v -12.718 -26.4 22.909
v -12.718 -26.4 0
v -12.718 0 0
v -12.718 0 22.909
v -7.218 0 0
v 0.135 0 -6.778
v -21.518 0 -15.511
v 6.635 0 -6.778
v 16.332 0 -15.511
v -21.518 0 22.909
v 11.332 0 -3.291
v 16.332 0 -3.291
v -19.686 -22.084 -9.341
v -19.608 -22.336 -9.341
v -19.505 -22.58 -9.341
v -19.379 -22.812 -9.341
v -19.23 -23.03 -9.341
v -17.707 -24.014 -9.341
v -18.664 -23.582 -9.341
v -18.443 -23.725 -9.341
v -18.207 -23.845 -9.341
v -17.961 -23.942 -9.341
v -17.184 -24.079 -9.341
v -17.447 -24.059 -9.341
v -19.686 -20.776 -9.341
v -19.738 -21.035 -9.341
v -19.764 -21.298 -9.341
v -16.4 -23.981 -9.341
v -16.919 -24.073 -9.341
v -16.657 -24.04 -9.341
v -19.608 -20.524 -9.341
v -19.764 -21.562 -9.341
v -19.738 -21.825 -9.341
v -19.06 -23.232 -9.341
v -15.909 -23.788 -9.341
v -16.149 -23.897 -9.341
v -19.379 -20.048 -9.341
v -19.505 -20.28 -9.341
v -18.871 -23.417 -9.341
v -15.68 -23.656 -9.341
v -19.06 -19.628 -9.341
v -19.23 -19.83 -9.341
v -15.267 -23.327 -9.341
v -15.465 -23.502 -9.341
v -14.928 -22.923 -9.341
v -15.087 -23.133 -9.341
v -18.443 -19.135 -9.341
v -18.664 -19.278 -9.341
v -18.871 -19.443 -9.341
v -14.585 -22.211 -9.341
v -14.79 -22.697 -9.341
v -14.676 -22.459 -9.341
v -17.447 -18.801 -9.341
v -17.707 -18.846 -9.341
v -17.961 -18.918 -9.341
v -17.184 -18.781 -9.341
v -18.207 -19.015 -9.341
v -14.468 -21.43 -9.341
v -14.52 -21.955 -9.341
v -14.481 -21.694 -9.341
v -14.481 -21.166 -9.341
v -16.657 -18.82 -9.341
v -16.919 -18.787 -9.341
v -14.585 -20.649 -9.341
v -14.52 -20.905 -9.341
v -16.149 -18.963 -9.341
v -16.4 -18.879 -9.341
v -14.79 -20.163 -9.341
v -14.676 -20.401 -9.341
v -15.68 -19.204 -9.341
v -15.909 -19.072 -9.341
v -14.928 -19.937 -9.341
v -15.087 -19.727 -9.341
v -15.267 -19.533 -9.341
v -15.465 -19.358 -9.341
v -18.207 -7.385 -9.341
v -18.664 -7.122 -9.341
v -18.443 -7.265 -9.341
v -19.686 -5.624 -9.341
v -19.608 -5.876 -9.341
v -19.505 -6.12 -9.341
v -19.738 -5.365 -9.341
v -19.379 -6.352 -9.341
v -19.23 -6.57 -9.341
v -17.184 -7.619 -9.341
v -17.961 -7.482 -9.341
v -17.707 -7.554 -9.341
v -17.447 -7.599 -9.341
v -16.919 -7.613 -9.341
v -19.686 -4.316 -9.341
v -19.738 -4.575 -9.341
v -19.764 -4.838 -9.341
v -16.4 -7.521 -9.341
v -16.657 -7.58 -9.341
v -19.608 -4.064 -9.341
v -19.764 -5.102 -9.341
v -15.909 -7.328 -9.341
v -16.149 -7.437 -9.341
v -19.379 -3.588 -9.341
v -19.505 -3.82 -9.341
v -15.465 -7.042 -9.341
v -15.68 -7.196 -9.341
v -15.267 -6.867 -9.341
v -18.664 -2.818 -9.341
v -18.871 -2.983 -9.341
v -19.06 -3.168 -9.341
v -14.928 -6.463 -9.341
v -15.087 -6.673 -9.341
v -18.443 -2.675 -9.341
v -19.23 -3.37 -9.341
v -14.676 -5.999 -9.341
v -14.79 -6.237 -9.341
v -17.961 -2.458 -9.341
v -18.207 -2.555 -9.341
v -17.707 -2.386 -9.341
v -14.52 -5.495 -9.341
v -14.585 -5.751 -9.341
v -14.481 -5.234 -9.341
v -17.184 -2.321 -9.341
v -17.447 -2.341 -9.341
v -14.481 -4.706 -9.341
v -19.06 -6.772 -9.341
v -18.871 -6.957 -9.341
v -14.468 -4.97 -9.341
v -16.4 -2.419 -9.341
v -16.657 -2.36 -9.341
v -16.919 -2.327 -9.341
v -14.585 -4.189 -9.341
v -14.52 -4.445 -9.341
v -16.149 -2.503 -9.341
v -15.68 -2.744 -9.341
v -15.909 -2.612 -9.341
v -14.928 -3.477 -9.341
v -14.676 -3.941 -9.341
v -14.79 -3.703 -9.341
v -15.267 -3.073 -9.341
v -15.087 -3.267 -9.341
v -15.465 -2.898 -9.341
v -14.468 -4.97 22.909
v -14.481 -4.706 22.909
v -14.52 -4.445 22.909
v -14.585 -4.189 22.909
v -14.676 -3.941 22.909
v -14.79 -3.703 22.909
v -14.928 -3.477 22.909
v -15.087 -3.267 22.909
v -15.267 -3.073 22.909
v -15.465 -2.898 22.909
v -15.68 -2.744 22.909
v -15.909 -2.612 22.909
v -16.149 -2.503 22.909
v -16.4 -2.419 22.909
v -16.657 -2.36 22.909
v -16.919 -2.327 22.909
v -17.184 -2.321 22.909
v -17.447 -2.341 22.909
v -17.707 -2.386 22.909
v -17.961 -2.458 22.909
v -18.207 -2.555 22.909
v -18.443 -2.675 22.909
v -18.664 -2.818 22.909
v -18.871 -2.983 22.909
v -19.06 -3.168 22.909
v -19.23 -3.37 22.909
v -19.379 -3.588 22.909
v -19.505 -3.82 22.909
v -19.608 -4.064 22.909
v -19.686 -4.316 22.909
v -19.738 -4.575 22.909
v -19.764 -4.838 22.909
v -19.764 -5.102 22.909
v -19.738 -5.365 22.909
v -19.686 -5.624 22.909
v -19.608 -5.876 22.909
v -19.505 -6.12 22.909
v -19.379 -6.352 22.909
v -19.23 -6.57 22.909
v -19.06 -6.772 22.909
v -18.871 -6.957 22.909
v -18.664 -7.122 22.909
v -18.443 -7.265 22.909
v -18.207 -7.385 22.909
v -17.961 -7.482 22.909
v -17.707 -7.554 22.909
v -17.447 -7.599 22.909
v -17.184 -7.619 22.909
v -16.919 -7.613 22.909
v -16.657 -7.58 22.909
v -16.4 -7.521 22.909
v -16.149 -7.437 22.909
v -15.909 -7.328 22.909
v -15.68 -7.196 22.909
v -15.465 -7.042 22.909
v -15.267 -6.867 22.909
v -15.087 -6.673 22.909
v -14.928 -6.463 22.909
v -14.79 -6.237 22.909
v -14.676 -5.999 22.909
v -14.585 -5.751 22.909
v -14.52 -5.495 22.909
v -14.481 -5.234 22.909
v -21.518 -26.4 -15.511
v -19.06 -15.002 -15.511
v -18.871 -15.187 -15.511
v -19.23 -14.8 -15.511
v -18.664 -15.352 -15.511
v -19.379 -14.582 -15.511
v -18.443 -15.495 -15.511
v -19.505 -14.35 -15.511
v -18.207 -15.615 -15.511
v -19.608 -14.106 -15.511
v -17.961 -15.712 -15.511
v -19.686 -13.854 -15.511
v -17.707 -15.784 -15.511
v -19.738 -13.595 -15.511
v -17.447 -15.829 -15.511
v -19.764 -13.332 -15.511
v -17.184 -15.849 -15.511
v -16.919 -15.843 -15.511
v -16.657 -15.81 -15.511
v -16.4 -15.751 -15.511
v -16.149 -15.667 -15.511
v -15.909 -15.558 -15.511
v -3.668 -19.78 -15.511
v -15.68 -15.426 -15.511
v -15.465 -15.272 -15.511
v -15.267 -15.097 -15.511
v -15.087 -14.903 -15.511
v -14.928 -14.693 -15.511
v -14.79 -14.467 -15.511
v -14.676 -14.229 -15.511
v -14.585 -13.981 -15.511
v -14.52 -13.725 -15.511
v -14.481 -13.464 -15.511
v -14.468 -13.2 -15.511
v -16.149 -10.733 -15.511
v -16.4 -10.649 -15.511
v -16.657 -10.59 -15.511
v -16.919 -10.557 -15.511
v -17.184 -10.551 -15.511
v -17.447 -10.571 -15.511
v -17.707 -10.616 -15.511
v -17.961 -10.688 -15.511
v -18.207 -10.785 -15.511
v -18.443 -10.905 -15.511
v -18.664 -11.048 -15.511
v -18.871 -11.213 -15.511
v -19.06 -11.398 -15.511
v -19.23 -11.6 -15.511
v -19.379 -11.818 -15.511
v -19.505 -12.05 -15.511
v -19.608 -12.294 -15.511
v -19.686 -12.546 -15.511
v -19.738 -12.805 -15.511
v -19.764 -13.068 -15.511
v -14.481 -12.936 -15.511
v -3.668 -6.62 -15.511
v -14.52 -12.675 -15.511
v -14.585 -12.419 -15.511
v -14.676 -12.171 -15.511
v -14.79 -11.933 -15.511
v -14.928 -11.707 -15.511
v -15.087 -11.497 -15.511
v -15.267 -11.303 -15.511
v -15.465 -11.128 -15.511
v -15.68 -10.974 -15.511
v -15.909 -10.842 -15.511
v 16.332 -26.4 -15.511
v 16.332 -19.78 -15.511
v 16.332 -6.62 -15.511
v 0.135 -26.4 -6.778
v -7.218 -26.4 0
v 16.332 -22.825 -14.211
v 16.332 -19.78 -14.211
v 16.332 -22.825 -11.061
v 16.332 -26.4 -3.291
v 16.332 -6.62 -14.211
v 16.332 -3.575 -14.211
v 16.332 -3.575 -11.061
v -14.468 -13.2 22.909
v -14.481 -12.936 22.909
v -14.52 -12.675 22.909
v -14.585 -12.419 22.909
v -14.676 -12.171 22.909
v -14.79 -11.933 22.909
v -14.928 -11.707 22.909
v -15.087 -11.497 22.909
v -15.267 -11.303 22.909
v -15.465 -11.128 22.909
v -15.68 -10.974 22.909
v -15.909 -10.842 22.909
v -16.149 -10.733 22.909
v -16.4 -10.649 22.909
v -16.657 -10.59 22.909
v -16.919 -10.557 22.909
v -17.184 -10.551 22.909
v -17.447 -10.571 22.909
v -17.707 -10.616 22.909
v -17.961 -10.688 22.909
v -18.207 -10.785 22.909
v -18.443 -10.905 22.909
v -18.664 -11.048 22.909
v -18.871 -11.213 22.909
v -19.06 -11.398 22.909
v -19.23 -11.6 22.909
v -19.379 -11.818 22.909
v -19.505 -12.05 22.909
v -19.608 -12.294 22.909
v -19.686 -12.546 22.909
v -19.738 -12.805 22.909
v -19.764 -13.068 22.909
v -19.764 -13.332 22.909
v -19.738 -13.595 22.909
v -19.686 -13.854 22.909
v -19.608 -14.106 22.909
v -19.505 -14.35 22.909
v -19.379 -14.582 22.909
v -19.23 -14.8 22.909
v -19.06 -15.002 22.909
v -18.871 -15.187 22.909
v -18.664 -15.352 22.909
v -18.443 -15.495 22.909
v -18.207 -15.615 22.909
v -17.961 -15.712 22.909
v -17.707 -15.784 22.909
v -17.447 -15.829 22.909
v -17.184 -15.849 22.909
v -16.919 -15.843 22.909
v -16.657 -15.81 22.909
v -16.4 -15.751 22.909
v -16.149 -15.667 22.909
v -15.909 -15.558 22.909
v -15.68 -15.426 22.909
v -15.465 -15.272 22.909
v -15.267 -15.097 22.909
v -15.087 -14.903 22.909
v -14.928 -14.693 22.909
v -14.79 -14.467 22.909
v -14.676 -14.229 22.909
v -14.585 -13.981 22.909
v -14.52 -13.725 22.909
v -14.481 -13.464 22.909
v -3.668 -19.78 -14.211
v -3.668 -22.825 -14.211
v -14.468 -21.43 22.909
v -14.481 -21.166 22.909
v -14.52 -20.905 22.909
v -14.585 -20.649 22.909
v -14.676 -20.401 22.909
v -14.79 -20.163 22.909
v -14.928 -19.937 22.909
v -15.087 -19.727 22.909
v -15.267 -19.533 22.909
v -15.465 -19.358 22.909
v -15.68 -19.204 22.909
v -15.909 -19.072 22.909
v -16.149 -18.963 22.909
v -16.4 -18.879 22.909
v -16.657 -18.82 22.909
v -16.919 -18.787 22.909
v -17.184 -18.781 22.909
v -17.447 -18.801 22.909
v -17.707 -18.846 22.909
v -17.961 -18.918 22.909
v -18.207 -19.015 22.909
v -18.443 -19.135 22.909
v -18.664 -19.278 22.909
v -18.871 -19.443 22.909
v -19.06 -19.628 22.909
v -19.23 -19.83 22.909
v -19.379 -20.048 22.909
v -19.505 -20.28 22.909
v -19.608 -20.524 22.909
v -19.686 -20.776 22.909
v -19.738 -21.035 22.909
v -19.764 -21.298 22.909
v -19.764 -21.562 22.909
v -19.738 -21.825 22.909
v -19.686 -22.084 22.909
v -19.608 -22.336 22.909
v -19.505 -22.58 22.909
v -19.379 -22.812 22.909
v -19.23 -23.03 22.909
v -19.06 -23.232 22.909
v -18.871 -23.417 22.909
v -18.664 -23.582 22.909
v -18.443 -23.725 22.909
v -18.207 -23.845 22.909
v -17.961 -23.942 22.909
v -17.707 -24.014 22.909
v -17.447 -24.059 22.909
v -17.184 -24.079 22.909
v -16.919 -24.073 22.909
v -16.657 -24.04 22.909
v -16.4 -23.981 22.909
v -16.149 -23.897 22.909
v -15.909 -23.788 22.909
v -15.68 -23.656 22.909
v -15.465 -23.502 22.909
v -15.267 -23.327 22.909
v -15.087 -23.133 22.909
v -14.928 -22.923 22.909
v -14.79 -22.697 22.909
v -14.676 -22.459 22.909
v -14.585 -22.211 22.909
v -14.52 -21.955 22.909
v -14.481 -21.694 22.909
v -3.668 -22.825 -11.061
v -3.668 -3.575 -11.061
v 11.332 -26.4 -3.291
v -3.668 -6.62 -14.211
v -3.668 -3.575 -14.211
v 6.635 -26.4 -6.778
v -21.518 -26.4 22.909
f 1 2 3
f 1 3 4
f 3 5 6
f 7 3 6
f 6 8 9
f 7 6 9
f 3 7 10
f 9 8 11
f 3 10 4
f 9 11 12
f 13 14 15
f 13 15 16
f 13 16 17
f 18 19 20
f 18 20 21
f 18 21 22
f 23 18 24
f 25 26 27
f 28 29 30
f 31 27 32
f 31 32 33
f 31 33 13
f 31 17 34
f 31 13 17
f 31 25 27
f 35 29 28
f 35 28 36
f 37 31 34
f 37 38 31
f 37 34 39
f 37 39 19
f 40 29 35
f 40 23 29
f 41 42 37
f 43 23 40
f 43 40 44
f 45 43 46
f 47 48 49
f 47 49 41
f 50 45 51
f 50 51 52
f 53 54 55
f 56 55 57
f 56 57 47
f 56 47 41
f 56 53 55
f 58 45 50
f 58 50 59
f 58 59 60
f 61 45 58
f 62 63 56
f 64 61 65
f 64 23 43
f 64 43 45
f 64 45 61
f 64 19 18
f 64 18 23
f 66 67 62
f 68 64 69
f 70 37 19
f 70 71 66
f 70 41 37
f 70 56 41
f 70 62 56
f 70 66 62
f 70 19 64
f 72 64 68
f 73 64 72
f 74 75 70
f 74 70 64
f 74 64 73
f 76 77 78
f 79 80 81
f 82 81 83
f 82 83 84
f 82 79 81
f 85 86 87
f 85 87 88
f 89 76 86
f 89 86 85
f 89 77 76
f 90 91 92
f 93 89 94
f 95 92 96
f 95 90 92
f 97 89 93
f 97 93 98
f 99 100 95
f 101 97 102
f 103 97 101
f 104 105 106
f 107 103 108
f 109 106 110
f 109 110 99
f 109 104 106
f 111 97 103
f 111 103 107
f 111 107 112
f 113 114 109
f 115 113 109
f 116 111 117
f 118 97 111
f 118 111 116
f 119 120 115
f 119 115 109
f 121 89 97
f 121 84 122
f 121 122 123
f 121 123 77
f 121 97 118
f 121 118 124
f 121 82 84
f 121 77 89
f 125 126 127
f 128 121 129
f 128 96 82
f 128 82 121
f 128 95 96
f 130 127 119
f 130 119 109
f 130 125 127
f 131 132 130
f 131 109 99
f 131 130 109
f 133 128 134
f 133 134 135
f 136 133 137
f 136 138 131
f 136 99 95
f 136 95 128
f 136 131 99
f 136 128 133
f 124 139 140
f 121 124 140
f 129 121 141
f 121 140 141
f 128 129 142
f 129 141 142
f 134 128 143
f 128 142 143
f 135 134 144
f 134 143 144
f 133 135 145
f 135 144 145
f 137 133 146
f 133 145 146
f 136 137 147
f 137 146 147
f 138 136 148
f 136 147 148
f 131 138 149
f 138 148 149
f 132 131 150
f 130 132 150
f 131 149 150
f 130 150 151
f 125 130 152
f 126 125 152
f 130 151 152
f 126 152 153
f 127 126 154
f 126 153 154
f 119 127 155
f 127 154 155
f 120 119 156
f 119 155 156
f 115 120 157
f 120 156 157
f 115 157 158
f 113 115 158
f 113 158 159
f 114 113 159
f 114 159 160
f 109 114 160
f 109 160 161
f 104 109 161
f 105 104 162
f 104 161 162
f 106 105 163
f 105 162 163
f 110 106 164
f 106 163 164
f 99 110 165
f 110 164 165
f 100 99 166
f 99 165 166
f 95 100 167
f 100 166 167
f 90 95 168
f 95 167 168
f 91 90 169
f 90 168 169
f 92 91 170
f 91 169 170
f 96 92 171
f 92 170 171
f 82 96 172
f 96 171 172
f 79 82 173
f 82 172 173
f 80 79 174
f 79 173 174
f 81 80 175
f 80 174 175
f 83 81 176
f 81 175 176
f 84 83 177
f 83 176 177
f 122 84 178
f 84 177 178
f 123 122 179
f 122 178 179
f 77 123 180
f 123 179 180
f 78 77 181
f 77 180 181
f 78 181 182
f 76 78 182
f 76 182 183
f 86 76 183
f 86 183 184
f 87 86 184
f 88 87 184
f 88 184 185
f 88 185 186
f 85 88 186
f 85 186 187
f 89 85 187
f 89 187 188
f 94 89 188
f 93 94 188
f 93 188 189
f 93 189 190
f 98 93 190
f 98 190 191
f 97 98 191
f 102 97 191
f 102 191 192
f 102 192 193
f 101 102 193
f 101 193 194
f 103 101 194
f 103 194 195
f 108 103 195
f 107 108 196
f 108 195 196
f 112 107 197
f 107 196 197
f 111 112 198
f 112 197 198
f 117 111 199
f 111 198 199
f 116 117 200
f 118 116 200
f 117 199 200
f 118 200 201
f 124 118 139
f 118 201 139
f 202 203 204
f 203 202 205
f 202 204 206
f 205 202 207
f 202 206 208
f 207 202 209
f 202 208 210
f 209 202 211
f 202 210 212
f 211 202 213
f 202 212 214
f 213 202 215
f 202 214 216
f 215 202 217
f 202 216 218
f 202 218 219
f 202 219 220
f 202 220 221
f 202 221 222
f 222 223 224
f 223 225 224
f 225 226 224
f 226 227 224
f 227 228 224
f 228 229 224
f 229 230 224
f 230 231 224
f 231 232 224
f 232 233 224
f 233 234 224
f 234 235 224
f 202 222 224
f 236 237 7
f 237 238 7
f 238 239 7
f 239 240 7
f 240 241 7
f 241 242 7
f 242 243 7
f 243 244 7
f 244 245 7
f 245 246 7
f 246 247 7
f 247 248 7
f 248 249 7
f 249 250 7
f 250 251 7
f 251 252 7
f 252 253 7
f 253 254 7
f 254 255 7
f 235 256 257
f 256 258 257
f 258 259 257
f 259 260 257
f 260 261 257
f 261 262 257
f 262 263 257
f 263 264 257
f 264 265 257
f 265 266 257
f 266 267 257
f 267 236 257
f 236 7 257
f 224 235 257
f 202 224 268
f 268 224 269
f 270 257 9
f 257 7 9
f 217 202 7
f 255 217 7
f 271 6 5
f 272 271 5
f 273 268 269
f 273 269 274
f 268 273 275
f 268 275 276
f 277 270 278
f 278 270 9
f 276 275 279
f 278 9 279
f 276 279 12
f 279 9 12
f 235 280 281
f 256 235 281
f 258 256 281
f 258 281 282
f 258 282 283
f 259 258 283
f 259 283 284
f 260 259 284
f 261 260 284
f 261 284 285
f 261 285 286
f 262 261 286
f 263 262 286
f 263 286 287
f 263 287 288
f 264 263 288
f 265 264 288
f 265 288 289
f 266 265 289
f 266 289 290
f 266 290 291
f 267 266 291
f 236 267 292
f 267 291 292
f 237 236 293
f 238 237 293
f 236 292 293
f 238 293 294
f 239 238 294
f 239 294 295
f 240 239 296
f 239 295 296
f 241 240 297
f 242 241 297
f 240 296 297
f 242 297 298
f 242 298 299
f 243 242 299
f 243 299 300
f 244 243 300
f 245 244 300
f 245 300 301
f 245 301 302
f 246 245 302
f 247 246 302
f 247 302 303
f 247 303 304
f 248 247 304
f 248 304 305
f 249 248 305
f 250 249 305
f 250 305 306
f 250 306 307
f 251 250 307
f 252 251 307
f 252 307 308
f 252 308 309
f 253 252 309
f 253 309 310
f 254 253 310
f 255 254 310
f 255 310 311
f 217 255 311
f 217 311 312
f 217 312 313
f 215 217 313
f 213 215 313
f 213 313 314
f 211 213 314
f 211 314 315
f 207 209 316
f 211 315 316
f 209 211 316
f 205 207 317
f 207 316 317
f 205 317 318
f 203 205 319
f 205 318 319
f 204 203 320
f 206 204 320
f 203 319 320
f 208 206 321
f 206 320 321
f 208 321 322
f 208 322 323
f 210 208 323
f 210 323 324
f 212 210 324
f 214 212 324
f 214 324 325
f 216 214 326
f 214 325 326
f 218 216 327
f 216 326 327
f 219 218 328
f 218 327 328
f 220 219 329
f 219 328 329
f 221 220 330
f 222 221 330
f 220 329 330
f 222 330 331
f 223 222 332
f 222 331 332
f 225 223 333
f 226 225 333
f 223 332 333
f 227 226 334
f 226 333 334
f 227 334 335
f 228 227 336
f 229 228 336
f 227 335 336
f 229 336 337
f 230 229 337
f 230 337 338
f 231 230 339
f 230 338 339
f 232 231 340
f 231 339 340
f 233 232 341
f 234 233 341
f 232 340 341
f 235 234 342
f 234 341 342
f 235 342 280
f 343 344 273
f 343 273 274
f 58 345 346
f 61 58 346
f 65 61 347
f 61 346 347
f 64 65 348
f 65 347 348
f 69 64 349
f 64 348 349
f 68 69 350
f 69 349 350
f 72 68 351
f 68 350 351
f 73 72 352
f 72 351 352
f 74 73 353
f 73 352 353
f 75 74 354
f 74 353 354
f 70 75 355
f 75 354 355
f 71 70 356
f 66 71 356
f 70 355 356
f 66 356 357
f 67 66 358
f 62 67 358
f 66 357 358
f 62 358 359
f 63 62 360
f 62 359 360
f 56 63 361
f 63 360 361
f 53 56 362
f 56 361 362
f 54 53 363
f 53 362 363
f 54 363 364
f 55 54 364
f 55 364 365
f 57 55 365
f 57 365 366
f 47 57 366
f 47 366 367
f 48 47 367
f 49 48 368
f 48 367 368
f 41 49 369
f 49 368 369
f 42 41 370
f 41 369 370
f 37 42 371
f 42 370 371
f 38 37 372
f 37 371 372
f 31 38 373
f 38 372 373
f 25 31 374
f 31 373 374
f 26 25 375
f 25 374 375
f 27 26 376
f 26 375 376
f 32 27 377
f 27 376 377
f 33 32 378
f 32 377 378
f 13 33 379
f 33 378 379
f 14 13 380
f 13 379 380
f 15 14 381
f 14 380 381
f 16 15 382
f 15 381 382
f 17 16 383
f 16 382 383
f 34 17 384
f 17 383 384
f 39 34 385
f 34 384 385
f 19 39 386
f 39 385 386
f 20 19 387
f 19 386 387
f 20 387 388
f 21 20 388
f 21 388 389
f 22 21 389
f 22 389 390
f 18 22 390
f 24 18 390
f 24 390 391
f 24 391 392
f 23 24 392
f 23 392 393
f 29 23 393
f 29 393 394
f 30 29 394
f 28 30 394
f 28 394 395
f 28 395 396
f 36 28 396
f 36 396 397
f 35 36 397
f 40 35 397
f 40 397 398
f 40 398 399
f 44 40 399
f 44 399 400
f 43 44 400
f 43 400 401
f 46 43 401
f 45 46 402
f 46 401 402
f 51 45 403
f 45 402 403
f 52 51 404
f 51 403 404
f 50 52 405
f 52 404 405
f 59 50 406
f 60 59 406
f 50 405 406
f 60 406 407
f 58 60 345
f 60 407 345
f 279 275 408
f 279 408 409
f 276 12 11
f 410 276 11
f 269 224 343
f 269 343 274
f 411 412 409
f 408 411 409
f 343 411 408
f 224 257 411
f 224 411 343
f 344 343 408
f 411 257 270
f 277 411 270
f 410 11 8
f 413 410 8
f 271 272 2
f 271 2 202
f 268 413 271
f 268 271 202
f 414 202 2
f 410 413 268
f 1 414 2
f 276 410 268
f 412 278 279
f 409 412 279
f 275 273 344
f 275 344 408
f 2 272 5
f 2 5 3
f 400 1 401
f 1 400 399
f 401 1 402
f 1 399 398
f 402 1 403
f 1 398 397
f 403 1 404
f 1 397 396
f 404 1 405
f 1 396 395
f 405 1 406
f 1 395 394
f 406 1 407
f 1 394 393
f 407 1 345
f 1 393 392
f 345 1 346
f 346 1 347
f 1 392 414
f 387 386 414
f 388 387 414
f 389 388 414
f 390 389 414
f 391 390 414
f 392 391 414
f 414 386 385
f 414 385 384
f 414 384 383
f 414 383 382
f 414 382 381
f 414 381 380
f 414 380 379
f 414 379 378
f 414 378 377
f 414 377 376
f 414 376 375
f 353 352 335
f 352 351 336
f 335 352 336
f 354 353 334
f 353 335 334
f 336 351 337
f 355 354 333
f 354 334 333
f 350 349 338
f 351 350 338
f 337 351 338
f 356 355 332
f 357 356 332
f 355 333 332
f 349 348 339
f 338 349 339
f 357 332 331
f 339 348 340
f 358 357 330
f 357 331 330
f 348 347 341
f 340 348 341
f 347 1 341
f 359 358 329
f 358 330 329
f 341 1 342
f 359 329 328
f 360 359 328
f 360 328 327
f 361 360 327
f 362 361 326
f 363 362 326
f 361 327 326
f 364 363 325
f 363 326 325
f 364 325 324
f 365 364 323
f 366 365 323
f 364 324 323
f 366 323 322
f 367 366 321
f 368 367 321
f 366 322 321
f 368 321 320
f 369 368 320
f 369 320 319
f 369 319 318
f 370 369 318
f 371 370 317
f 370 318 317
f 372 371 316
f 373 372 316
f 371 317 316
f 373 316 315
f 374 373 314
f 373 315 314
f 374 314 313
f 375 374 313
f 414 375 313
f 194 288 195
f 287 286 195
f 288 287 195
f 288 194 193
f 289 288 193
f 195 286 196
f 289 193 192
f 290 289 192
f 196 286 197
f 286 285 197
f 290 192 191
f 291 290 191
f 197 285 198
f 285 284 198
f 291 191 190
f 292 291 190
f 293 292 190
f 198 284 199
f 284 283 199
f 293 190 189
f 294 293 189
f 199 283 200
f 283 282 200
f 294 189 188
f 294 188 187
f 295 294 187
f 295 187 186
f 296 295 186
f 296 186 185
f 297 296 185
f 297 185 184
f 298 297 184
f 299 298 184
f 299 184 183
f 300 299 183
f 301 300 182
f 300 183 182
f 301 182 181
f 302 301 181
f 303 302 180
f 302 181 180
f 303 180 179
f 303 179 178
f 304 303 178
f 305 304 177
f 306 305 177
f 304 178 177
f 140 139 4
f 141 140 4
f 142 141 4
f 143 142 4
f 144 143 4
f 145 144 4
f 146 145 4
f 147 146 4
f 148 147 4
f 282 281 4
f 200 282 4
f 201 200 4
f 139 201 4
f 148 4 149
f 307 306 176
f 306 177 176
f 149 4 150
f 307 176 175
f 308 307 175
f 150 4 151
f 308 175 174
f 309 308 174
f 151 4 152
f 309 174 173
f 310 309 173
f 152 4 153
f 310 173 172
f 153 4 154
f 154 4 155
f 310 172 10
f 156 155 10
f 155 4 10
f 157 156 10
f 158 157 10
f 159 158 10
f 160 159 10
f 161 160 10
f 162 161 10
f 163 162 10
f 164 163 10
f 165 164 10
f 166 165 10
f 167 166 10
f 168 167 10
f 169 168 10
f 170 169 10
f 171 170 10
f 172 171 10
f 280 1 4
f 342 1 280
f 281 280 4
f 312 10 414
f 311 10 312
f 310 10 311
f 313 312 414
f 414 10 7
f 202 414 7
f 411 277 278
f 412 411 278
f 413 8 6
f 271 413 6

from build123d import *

# Parameters (mm, degrees)
F1_DEPTH = 26.4
F2_R     = 2.65
F3_DEPTH = 32.25
F4_DEPTH = 40
F5_W     = 20
F5_H     = 13.16
F6_DEPTH = 4.45
F7_W     = 3.045
F7_H     = 3.15
F8_DEPTH = 20


# Not quite as in the source:
# - a feature names something its author has since deleted; it is built from what else it names


with BuildPart() as f1:
    # F0 (on Front) → F1 (new body)
    with BuildSketch(Plane.XZ):
        Polygon((-12.7175080026, 22.9085270187), (-21.5175080026, 22.9085270187), (-21.5175080026, -15.5114729813), (16.3324919974, -15.5114729813), (16.3324919974, -3.2914729813), (11.3324919974, -3.2914729813), (6.6349683525, -6.7779857958), (0.1349683525, -6.7779857958), (-7.2175080026, 0), (-12.7175080026, 0), align=None)
    extrude(amount=F1_DEPTH)

    # F2 (on face) → F3 (cut)
    with BuildSketch(Plane.XY.offset(22.9085270187)):
        with Locations((-17.1175080026, -4.97)):
            Circle(F2_R)
        with Locations((-17.1175080026, -21.43)):
            Circle(F2_R)
    extrude(amount=-F3_DEPTH, mode=Mode.SUBTRACT)

    # F2 (on face) → F4 (cut)
    with BuildSketch(Plane.XY.offset(22.9085270187)):
        with Locations((-17.1175080026, -13.2)):
            Circle(F2_R)
    extrude(amount=-F4_DEPTH, mode=Mode.SUBTRACT)

    # F5 (on face) → F6 (cut)
    with BuildSketch(Plane(origin=(0, 0, -15.5114729813), x_dir=(1, 0, 0), z_dir=(0, 0, -1))):
        with Locations((6.3324919974, 13.2)):
            Rectangle(F5_W, F5_H)
    extrude(amount=-F6_DEPTH, mode=Mode.SUBTRACT)

    # F7 (on face) → F8 (cut)
    with BuildSketch(Plane.YZ.offset(16.3324919974)):
        with Locations((-5.0975, -12.6364729813)):
            Rectangle(F7_W, F7_H)
        with Locations((-21.3025, -12.6364729813)):
            Rectangle(F7_W, F7_H)
    extrude(amount=-F8_DEPTH, mode=Mode.SUBTRACT)


solid = f1.part
